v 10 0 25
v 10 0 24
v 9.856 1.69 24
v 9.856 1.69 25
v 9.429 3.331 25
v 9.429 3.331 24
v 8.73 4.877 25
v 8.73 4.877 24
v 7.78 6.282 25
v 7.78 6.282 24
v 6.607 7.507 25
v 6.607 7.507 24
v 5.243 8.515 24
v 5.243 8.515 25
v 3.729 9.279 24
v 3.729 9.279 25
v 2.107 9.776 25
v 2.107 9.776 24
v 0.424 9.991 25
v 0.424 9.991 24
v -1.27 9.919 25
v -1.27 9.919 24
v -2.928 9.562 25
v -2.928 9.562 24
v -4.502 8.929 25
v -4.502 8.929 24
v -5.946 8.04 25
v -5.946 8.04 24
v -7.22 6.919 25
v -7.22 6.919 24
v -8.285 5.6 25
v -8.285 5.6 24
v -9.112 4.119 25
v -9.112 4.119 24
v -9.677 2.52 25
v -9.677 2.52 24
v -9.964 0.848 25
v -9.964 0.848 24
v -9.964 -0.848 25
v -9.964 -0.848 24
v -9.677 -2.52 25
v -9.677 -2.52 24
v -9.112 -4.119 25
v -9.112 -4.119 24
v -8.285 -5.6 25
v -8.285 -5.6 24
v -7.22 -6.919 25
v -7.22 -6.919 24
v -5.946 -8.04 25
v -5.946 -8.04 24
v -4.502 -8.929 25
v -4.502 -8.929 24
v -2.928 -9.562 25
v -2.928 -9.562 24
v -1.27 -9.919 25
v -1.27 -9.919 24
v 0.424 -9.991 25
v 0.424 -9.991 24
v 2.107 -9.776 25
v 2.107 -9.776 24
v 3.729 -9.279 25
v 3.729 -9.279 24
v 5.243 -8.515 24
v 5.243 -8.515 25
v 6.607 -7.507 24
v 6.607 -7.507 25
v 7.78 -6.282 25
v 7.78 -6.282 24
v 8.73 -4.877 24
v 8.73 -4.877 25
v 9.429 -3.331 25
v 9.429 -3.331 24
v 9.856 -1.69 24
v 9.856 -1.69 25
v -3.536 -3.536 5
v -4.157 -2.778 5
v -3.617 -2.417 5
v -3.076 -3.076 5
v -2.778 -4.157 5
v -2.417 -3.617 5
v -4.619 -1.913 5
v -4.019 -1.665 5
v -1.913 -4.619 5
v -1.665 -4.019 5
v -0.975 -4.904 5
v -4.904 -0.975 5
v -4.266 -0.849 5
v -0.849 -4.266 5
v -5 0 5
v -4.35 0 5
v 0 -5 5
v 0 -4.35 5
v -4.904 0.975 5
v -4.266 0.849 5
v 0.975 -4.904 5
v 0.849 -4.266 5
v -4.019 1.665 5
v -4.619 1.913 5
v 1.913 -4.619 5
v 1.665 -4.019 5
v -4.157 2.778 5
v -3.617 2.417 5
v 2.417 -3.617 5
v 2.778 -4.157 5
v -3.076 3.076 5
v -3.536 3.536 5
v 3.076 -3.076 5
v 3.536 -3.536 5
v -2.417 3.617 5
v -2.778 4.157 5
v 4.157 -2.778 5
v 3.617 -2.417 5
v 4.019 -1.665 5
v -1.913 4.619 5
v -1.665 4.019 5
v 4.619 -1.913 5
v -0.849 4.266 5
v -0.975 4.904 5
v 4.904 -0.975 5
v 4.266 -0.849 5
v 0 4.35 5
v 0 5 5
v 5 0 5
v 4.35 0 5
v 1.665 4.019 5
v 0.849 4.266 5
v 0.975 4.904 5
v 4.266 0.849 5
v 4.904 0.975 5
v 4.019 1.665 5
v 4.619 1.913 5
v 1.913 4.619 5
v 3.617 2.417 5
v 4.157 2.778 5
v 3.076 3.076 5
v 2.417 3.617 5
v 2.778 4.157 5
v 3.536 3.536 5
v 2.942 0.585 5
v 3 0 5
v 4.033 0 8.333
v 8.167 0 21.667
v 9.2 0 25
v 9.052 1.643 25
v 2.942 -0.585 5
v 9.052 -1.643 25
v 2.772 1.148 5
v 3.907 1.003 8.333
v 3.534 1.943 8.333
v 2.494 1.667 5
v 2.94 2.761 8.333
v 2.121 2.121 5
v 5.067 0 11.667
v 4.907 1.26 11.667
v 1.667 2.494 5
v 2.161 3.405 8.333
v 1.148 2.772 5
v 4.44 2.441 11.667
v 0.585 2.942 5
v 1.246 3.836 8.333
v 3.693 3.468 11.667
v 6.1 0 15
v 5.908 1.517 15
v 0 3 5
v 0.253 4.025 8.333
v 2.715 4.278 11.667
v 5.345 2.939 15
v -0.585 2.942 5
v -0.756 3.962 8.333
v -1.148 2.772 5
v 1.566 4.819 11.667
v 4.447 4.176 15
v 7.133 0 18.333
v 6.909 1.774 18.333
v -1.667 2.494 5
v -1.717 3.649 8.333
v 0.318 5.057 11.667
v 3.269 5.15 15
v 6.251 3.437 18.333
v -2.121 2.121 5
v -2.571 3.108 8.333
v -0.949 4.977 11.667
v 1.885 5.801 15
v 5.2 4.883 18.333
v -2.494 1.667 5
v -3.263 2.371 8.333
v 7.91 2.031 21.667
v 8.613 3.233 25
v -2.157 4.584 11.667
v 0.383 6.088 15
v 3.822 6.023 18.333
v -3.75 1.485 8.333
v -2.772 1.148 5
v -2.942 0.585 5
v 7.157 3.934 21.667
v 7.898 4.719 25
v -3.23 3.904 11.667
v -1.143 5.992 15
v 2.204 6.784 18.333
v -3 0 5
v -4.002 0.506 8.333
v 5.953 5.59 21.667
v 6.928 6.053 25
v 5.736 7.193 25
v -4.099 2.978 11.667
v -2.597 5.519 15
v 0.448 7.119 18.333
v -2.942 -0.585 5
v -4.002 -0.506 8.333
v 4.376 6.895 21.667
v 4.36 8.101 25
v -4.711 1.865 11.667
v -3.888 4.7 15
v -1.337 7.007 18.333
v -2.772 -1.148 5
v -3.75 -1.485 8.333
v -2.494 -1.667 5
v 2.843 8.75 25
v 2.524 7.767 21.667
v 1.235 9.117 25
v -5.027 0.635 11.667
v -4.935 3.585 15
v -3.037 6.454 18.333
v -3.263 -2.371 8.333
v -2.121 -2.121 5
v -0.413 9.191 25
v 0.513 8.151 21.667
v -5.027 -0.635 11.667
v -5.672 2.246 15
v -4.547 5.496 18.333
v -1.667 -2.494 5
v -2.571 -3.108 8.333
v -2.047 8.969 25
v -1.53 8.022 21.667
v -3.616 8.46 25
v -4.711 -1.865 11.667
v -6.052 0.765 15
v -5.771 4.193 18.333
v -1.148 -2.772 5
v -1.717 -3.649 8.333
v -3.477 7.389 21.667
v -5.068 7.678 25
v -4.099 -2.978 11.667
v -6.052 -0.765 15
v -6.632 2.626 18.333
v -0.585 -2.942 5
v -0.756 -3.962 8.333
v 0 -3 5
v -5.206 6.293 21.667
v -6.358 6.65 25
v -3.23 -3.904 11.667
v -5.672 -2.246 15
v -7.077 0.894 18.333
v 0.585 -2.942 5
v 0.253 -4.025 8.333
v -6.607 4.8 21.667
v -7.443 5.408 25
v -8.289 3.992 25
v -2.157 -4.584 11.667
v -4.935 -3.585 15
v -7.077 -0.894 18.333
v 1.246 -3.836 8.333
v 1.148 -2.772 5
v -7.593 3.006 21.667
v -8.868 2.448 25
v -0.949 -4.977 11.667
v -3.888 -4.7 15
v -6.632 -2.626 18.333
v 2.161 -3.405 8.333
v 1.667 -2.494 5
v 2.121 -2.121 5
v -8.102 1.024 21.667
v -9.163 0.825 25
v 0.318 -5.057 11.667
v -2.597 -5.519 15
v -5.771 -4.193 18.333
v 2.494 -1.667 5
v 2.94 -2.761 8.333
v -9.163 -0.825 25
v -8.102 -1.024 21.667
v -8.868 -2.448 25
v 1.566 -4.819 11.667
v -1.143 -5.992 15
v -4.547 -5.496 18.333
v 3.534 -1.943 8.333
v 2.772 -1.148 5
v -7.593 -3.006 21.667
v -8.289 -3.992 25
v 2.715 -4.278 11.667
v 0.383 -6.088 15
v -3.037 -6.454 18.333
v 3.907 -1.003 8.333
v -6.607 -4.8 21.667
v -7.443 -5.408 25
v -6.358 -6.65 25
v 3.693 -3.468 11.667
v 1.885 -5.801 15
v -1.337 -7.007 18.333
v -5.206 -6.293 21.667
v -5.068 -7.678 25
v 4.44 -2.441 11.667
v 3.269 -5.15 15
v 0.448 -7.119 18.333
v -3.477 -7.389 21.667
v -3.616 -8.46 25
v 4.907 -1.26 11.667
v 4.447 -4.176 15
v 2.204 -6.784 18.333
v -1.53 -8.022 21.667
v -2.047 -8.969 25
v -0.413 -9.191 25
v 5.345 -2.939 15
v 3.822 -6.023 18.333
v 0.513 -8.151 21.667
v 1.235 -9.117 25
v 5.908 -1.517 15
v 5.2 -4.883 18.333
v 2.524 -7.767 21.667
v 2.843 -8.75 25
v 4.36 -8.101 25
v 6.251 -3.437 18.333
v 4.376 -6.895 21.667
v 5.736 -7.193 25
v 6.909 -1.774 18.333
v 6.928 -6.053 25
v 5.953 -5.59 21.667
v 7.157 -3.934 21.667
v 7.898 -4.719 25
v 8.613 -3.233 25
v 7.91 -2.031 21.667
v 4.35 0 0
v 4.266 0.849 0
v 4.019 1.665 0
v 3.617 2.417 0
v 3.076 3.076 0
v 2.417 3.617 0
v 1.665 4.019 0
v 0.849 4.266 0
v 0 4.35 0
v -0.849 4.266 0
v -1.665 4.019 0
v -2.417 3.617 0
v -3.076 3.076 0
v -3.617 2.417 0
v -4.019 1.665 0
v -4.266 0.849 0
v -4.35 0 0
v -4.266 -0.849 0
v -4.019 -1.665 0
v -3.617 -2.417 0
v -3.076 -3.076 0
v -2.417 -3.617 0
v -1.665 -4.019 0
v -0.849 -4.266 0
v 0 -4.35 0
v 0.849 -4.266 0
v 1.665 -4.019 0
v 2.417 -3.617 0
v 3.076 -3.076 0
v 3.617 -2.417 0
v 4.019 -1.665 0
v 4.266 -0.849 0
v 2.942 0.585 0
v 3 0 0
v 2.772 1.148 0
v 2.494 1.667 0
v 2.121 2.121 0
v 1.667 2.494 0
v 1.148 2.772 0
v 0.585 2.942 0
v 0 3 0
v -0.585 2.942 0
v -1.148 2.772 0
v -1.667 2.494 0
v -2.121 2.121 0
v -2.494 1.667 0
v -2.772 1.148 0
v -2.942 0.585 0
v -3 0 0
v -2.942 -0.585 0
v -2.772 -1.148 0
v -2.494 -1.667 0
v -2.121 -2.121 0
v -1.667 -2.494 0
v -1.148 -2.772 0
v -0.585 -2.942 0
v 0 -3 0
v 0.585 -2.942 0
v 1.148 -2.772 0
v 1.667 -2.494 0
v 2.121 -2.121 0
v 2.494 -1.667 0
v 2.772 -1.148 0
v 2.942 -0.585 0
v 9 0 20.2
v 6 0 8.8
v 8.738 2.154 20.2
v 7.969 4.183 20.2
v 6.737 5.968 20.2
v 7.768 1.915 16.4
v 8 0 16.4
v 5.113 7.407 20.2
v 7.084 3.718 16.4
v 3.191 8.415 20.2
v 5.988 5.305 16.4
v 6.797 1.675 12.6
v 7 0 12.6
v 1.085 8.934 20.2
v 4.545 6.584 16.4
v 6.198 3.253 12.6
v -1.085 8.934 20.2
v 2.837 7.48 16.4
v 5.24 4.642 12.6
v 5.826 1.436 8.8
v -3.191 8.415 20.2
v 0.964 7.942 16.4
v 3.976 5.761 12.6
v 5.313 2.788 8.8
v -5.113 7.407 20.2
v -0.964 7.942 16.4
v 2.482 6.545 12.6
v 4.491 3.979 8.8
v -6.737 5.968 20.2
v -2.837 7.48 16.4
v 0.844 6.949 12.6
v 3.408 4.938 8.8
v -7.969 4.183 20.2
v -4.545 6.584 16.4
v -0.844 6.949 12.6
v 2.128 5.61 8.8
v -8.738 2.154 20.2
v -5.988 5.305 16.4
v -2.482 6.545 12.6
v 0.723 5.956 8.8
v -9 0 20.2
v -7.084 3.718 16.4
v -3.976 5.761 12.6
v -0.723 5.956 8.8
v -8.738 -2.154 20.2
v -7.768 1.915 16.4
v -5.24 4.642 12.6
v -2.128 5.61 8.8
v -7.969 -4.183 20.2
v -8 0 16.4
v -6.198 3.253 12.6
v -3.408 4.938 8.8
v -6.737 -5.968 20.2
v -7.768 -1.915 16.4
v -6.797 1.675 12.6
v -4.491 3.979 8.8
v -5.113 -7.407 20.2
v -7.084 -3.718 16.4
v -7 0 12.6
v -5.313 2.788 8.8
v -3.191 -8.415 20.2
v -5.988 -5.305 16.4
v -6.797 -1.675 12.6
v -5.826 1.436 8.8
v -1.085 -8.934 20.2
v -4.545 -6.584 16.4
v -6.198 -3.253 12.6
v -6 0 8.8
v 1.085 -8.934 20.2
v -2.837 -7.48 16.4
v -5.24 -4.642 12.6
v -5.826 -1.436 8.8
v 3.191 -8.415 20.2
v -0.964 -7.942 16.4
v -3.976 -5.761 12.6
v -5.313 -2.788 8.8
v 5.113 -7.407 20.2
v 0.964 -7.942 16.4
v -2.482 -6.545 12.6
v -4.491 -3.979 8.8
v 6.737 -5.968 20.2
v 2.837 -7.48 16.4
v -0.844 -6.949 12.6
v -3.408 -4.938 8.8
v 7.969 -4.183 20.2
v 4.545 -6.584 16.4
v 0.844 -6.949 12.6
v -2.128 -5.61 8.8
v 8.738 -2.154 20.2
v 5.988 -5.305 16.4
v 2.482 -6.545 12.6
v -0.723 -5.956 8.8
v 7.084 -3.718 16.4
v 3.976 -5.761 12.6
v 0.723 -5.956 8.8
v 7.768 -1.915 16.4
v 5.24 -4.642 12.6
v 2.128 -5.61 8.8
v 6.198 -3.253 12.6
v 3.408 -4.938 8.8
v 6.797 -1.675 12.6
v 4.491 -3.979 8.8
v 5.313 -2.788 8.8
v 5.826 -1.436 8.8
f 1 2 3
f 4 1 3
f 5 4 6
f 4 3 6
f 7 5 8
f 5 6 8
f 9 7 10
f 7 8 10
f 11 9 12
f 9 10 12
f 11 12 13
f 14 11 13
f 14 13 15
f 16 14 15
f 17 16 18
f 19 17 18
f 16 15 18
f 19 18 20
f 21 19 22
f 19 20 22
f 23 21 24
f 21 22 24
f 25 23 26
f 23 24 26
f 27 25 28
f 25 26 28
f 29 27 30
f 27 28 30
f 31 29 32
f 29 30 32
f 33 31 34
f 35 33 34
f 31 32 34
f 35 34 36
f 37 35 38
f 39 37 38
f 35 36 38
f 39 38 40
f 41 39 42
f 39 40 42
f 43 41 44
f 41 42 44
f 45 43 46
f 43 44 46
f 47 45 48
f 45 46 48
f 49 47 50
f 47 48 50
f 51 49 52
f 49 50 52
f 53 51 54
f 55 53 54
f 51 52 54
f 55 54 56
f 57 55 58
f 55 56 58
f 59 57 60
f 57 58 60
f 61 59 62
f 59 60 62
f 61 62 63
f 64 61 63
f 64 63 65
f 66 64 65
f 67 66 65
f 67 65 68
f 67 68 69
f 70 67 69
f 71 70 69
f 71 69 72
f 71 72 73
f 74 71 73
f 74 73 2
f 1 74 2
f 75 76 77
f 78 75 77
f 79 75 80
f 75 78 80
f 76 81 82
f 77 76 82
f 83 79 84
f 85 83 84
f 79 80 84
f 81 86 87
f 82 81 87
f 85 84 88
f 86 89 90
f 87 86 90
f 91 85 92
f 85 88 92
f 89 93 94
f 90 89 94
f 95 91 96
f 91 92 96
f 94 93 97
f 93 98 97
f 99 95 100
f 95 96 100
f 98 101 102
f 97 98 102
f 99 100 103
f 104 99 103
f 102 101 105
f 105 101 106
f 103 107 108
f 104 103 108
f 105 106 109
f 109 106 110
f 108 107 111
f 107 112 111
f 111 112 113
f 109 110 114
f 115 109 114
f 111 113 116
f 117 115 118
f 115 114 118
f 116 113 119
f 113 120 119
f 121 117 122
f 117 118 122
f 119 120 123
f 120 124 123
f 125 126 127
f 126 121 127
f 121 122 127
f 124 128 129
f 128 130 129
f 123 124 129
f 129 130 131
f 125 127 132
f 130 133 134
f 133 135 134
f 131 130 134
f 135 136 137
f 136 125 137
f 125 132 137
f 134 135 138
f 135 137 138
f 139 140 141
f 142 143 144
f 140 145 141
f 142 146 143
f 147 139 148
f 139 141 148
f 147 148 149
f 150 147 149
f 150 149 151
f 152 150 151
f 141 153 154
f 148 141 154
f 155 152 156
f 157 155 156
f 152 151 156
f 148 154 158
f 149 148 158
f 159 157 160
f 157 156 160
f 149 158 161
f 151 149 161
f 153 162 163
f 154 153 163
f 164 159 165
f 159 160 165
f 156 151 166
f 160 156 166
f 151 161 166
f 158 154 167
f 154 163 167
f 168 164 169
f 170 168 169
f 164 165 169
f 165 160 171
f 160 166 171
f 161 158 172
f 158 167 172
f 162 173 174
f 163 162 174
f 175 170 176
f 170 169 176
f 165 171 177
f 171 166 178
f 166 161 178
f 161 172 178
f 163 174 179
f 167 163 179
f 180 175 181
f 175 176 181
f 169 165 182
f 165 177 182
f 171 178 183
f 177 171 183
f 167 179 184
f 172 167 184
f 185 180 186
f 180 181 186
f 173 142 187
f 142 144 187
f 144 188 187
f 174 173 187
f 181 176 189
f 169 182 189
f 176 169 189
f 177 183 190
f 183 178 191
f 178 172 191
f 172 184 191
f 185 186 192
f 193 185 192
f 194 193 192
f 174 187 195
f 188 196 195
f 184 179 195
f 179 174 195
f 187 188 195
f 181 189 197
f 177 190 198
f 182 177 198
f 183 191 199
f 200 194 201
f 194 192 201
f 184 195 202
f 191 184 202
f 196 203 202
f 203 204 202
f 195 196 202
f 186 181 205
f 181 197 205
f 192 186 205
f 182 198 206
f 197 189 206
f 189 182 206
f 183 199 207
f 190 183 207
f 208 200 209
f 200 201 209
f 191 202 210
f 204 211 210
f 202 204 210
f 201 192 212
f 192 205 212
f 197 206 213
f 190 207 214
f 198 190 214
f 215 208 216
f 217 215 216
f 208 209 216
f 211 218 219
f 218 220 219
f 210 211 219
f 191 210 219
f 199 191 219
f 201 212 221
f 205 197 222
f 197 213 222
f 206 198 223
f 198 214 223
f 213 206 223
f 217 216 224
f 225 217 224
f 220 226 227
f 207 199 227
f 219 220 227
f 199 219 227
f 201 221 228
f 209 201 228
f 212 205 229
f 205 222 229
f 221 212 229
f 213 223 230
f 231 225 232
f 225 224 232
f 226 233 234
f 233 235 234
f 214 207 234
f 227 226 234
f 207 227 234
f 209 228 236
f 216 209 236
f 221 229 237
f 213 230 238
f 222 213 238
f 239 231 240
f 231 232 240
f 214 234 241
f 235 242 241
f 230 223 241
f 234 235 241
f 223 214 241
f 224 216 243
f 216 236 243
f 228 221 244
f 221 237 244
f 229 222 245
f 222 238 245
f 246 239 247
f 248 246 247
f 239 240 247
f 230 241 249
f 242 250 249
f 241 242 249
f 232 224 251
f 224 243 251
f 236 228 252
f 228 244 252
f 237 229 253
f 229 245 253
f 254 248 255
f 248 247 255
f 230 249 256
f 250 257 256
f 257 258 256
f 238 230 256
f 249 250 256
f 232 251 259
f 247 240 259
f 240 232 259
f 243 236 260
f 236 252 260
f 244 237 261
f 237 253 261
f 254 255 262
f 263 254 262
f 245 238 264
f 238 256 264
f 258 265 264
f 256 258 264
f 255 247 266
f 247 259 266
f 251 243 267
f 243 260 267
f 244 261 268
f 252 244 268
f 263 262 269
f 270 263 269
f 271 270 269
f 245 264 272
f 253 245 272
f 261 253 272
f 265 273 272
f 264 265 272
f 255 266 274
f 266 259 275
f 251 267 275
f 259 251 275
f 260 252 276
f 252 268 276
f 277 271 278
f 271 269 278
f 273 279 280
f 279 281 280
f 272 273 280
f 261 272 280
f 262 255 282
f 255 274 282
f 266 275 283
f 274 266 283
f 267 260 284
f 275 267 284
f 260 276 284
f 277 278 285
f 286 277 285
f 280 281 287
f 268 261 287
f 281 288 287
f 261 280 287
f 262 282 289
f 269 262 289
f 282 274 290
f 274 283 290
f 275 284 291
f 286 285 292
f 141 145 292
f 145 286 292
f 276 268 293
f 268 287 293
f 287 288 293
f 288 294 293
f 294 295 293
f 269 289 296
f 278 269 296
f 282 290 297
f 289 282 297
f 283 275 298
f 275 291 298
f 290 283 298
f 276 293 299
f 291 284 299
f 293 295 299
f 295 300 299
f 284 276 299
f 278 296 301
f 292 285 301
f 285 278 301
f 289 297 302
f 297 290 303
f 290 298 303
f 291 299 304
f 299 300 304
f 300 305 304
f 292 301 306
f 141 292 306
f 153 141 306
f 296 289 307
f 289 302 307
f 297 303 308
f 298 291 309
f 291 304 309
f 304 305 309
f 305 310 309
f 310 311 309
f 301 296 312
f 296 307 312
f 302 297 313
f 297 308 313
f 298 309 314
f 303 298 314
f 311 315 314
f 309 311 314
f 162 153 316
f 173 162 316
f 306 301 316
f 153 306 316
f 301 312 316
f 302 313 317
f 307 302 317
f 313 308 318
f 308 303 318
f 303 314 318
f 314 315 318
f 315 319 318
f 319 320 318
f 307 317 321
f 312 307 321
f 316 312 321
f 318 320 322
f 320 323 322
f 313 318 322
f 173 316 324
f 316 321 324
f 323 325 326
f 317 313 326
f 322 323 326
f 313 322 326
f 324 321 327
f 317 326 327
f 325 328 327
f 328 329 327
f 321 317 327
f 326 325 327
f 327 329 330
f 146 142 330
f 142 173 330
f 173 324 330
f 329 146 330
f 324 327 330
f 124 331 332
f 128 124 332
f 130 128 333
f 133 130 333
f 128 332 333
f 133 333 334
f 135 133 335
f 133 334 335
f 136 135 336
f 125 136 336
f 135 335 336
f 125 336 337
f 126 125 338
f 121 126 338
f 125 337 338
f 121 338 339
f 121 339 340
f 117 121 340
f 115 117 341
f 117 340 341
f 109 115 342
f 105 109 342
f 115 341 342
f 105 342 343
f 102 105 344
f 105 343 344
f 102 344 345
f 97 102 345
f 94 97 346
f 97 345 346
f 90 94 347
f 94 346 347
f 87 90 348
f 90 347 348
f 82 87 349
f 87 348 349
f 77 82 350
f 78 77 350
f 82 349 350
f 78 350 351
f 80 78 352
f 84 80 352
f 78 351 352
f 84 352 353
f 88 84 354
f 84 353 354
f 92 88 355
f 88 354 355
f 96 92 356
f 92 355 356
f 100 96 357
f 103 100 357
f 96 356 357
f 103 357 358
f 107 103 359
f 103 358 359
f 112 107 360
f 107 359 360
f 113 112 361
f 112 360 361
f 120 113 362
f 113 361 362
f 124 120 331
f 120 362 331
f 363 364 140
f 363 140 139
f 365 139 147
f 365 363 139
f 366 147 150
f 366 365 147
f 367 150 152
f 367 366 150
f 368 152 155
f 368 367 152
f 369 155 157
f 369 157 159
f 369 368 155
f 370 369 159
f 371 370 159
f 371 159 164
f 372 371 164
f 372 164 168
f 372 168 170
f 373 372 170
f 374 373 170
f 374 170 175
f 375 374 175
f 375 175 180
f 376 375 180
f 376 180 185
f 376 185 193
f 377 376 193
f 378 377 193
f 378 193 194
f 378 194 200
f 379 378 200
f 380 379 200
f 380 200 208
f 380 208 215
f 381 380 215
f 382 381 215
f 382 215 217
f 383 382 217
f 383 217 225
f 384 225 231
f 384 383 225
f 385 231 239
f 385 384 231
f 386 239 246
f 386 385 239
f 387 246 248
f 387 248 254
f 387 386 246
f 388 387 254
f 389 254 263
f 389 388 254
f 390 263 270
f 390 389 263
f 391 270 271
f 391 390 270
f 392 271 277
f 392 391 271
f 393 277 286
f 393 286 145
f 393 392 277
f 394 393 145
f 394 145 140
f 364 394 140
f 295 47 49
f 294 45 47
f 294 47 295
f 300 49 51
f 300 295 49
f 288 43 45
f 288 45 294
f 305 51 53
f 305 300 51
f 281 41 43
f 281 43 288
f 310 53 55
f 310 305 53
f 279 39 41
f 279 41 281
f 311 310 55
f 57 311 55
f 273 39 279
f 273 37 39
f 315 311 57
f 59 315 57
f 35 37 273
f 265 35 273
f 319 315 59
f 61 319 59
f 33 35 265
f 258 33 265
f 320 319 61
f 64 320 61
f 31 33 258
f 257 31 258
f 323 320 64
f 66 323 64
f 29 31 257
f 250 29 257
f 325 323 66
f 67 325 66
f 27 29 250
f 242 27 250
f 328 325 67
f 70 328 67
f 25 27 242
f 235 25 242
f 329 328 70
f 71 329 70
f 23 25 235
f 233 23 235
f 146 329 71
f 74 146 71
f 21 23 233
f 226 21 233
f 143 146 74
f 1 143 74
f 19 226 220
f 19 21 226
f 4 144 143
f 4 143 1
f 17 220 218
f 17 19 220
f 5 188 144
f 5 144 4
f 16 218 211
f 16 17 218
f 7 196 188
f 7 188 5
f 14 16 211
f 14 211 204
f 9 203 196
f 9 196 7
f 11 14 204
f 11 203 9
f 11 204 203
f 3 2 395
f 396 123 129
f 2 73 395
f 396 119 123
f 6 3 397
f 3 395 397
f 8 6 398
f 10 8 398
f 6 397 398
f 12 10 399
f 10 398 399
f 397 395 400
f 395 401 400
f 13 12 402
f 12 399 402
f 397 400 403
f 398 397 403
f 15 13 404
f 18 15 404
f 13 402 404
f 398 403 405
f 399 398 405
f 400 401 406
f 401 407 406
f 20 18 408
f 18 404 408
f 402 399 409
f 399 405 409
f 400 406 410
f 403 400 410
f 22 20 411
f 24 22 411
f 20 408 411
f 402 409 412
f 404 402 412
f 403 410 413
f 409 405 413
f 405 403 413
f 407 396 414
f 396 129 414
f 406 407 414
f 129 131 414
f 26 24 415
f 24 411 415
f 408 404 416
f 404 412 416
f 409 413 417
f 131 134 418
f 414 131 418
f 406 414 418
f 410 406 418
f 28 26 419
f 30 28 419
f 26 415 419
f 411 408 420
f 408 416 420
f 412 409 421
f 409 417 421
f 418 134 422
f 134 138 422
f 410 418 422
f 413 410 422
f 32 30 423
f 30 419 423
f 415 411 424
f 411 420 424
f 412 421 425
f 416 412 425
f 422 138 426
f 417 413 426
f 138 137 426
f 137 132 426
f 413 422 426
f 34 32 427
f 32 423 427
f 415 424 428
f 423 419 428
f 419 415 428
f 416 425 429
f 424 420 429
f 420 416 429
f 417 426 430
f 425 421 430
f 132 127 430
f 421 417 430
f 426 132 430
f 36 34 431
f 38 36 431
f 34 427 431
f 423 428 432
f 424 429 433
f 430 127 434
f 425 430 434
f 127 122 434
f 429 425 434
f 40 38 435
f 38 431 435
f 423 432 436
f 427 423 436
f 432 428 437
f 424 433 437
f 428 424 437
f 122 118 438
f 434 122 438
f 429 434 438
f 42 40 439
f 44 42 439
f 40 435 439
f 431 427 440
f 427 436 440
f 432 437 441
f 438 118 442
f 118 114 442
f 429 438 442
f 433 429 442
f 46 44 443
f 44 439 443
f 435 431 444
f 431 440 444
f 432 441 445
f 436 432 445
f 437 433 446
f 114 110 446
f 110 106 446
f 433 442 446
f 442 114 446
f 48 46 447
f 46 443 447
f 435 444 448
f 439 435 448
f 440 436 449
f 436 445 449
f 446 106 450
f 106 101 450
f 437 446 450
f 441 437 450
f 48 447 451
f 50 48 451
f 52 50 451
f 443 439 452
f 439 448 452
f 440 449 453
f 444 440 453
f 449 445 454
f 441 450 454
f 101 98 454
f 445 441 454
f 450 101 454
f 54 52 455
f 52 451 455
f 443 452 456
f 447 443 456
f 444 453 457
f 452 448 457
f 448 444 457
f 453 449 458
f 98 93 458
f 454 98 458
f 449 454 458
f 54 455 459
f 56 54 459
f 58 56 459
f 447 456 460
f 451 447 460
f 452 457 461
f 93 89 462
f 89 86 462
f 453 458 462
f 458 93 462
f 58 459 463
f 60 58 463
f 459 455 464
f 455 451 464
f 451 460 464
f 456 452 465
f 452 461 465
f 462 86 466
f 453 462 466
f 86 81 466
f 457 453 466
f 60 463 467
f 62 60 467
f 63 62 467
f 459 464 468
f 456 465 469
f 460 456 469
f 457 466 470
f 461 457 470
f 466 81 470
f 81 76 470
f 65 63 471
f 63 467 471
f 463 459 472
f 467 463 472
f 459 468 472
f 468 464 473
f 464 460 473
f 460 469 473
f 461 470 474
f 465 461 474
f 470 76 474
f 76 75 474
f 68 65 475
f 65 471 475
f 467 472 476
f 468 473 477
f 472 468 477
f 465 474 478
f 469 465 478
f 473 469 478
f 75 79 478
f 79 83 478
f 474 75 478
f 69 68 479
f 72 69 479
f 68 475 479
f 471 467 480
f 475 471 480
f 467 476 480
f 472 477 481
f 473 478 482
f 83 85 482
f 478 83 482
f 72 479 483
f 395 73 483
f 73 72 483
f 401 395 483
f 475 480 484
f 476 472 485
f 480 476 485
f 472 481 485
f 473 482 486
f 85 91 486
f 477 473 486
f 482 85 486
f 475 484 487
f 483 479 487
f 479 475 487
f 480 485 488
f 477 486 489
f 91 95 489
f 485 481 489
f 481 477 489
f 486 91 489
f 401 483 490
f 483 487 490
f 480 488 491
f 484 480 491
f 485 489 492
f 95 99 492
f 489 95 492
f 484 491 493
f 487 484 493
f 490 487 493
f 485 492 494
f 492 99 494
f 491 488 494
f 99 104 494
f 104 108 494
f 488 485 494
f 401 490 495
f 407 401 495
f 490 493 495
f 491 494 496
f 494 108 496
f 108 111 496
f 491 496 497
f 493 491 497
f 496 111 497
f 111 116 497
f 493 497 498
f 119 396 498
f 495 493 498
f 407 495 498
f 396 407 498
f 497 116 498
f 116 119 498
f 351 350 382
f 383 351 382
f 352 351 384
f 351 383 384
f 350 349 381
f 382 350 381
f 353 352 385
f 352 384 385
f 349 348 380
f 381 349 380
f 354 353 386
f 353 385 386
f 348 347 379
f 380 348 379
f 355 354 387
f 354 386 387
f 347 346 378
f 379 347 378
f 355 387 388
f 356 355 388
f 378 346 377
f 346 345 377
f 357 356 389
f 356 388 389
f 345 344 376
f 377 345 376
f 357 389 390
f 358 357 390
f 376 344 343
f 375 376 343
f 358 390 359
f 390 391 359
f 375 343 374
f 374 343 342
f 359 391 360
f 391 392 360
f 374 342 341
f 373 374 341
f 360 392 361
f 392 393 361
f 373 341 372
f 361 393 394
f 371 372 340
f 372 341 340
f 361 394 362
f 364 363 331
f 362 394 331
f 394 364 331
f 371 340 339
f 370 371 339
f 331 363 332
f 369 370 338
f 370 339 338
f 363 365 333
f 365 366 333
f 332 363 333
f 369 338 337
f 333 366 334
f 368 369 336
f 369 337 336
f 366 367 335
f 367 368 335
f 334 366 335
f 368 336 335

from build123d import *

# Parameters (mm, degrees)
F0_R     = 4.35
F0_R_2   = 3
F1_DEPTH = 5
F2_R     = 10
F2_R_2   = 3
F3_DEPTH = 20
F4_SIZE2 = 6.2
F4_SIZE  = 20
F5_SIZE2 = 5
F5_SIZE  = 19


with BuildPart() as f1:
    # F0 (on Top) → F1 (new body)
    with BuildSketch(Plane.XY):
        Circle(F0_R)
        Circle(F0_R_2, mode=Mode.SUBTRACT)
    extrude(amount=F1_DEPTH)

    # F2 (on face) → F3 (join)
    with BuildSketch(Plane.XY.offset(5)):
        Circle(F2_R)
        Circle(F2_R_2, mode=Mode.SUBTRACT)
    extrude(amount=F3_DEPTH)

    # F4
    f4_edges = [f1.edges().sort_by_distance(p)[0] for p in [
        (-3, 0, 25),
    ]]
    f4_side = f1.faces().sort_by_distance((-3, 0, 12.5))[0]
    chamfer(f4_edges, length=F4_SIZE, length2=F4_SIZE2, reference=f4_side)

    # F5
    f5_edges = [f1.edges().sort_by_distance(p)[0] for p in [
        (-10, 0, 5),
    ]]
    f5_side = f1.faces().sort_by_distance((-10, 0, 15))[0]
    chamfer(f5_edges, length=F5_SIZE, length2=F5_SIZE2, reference=f5_side)


solid = f1.part
